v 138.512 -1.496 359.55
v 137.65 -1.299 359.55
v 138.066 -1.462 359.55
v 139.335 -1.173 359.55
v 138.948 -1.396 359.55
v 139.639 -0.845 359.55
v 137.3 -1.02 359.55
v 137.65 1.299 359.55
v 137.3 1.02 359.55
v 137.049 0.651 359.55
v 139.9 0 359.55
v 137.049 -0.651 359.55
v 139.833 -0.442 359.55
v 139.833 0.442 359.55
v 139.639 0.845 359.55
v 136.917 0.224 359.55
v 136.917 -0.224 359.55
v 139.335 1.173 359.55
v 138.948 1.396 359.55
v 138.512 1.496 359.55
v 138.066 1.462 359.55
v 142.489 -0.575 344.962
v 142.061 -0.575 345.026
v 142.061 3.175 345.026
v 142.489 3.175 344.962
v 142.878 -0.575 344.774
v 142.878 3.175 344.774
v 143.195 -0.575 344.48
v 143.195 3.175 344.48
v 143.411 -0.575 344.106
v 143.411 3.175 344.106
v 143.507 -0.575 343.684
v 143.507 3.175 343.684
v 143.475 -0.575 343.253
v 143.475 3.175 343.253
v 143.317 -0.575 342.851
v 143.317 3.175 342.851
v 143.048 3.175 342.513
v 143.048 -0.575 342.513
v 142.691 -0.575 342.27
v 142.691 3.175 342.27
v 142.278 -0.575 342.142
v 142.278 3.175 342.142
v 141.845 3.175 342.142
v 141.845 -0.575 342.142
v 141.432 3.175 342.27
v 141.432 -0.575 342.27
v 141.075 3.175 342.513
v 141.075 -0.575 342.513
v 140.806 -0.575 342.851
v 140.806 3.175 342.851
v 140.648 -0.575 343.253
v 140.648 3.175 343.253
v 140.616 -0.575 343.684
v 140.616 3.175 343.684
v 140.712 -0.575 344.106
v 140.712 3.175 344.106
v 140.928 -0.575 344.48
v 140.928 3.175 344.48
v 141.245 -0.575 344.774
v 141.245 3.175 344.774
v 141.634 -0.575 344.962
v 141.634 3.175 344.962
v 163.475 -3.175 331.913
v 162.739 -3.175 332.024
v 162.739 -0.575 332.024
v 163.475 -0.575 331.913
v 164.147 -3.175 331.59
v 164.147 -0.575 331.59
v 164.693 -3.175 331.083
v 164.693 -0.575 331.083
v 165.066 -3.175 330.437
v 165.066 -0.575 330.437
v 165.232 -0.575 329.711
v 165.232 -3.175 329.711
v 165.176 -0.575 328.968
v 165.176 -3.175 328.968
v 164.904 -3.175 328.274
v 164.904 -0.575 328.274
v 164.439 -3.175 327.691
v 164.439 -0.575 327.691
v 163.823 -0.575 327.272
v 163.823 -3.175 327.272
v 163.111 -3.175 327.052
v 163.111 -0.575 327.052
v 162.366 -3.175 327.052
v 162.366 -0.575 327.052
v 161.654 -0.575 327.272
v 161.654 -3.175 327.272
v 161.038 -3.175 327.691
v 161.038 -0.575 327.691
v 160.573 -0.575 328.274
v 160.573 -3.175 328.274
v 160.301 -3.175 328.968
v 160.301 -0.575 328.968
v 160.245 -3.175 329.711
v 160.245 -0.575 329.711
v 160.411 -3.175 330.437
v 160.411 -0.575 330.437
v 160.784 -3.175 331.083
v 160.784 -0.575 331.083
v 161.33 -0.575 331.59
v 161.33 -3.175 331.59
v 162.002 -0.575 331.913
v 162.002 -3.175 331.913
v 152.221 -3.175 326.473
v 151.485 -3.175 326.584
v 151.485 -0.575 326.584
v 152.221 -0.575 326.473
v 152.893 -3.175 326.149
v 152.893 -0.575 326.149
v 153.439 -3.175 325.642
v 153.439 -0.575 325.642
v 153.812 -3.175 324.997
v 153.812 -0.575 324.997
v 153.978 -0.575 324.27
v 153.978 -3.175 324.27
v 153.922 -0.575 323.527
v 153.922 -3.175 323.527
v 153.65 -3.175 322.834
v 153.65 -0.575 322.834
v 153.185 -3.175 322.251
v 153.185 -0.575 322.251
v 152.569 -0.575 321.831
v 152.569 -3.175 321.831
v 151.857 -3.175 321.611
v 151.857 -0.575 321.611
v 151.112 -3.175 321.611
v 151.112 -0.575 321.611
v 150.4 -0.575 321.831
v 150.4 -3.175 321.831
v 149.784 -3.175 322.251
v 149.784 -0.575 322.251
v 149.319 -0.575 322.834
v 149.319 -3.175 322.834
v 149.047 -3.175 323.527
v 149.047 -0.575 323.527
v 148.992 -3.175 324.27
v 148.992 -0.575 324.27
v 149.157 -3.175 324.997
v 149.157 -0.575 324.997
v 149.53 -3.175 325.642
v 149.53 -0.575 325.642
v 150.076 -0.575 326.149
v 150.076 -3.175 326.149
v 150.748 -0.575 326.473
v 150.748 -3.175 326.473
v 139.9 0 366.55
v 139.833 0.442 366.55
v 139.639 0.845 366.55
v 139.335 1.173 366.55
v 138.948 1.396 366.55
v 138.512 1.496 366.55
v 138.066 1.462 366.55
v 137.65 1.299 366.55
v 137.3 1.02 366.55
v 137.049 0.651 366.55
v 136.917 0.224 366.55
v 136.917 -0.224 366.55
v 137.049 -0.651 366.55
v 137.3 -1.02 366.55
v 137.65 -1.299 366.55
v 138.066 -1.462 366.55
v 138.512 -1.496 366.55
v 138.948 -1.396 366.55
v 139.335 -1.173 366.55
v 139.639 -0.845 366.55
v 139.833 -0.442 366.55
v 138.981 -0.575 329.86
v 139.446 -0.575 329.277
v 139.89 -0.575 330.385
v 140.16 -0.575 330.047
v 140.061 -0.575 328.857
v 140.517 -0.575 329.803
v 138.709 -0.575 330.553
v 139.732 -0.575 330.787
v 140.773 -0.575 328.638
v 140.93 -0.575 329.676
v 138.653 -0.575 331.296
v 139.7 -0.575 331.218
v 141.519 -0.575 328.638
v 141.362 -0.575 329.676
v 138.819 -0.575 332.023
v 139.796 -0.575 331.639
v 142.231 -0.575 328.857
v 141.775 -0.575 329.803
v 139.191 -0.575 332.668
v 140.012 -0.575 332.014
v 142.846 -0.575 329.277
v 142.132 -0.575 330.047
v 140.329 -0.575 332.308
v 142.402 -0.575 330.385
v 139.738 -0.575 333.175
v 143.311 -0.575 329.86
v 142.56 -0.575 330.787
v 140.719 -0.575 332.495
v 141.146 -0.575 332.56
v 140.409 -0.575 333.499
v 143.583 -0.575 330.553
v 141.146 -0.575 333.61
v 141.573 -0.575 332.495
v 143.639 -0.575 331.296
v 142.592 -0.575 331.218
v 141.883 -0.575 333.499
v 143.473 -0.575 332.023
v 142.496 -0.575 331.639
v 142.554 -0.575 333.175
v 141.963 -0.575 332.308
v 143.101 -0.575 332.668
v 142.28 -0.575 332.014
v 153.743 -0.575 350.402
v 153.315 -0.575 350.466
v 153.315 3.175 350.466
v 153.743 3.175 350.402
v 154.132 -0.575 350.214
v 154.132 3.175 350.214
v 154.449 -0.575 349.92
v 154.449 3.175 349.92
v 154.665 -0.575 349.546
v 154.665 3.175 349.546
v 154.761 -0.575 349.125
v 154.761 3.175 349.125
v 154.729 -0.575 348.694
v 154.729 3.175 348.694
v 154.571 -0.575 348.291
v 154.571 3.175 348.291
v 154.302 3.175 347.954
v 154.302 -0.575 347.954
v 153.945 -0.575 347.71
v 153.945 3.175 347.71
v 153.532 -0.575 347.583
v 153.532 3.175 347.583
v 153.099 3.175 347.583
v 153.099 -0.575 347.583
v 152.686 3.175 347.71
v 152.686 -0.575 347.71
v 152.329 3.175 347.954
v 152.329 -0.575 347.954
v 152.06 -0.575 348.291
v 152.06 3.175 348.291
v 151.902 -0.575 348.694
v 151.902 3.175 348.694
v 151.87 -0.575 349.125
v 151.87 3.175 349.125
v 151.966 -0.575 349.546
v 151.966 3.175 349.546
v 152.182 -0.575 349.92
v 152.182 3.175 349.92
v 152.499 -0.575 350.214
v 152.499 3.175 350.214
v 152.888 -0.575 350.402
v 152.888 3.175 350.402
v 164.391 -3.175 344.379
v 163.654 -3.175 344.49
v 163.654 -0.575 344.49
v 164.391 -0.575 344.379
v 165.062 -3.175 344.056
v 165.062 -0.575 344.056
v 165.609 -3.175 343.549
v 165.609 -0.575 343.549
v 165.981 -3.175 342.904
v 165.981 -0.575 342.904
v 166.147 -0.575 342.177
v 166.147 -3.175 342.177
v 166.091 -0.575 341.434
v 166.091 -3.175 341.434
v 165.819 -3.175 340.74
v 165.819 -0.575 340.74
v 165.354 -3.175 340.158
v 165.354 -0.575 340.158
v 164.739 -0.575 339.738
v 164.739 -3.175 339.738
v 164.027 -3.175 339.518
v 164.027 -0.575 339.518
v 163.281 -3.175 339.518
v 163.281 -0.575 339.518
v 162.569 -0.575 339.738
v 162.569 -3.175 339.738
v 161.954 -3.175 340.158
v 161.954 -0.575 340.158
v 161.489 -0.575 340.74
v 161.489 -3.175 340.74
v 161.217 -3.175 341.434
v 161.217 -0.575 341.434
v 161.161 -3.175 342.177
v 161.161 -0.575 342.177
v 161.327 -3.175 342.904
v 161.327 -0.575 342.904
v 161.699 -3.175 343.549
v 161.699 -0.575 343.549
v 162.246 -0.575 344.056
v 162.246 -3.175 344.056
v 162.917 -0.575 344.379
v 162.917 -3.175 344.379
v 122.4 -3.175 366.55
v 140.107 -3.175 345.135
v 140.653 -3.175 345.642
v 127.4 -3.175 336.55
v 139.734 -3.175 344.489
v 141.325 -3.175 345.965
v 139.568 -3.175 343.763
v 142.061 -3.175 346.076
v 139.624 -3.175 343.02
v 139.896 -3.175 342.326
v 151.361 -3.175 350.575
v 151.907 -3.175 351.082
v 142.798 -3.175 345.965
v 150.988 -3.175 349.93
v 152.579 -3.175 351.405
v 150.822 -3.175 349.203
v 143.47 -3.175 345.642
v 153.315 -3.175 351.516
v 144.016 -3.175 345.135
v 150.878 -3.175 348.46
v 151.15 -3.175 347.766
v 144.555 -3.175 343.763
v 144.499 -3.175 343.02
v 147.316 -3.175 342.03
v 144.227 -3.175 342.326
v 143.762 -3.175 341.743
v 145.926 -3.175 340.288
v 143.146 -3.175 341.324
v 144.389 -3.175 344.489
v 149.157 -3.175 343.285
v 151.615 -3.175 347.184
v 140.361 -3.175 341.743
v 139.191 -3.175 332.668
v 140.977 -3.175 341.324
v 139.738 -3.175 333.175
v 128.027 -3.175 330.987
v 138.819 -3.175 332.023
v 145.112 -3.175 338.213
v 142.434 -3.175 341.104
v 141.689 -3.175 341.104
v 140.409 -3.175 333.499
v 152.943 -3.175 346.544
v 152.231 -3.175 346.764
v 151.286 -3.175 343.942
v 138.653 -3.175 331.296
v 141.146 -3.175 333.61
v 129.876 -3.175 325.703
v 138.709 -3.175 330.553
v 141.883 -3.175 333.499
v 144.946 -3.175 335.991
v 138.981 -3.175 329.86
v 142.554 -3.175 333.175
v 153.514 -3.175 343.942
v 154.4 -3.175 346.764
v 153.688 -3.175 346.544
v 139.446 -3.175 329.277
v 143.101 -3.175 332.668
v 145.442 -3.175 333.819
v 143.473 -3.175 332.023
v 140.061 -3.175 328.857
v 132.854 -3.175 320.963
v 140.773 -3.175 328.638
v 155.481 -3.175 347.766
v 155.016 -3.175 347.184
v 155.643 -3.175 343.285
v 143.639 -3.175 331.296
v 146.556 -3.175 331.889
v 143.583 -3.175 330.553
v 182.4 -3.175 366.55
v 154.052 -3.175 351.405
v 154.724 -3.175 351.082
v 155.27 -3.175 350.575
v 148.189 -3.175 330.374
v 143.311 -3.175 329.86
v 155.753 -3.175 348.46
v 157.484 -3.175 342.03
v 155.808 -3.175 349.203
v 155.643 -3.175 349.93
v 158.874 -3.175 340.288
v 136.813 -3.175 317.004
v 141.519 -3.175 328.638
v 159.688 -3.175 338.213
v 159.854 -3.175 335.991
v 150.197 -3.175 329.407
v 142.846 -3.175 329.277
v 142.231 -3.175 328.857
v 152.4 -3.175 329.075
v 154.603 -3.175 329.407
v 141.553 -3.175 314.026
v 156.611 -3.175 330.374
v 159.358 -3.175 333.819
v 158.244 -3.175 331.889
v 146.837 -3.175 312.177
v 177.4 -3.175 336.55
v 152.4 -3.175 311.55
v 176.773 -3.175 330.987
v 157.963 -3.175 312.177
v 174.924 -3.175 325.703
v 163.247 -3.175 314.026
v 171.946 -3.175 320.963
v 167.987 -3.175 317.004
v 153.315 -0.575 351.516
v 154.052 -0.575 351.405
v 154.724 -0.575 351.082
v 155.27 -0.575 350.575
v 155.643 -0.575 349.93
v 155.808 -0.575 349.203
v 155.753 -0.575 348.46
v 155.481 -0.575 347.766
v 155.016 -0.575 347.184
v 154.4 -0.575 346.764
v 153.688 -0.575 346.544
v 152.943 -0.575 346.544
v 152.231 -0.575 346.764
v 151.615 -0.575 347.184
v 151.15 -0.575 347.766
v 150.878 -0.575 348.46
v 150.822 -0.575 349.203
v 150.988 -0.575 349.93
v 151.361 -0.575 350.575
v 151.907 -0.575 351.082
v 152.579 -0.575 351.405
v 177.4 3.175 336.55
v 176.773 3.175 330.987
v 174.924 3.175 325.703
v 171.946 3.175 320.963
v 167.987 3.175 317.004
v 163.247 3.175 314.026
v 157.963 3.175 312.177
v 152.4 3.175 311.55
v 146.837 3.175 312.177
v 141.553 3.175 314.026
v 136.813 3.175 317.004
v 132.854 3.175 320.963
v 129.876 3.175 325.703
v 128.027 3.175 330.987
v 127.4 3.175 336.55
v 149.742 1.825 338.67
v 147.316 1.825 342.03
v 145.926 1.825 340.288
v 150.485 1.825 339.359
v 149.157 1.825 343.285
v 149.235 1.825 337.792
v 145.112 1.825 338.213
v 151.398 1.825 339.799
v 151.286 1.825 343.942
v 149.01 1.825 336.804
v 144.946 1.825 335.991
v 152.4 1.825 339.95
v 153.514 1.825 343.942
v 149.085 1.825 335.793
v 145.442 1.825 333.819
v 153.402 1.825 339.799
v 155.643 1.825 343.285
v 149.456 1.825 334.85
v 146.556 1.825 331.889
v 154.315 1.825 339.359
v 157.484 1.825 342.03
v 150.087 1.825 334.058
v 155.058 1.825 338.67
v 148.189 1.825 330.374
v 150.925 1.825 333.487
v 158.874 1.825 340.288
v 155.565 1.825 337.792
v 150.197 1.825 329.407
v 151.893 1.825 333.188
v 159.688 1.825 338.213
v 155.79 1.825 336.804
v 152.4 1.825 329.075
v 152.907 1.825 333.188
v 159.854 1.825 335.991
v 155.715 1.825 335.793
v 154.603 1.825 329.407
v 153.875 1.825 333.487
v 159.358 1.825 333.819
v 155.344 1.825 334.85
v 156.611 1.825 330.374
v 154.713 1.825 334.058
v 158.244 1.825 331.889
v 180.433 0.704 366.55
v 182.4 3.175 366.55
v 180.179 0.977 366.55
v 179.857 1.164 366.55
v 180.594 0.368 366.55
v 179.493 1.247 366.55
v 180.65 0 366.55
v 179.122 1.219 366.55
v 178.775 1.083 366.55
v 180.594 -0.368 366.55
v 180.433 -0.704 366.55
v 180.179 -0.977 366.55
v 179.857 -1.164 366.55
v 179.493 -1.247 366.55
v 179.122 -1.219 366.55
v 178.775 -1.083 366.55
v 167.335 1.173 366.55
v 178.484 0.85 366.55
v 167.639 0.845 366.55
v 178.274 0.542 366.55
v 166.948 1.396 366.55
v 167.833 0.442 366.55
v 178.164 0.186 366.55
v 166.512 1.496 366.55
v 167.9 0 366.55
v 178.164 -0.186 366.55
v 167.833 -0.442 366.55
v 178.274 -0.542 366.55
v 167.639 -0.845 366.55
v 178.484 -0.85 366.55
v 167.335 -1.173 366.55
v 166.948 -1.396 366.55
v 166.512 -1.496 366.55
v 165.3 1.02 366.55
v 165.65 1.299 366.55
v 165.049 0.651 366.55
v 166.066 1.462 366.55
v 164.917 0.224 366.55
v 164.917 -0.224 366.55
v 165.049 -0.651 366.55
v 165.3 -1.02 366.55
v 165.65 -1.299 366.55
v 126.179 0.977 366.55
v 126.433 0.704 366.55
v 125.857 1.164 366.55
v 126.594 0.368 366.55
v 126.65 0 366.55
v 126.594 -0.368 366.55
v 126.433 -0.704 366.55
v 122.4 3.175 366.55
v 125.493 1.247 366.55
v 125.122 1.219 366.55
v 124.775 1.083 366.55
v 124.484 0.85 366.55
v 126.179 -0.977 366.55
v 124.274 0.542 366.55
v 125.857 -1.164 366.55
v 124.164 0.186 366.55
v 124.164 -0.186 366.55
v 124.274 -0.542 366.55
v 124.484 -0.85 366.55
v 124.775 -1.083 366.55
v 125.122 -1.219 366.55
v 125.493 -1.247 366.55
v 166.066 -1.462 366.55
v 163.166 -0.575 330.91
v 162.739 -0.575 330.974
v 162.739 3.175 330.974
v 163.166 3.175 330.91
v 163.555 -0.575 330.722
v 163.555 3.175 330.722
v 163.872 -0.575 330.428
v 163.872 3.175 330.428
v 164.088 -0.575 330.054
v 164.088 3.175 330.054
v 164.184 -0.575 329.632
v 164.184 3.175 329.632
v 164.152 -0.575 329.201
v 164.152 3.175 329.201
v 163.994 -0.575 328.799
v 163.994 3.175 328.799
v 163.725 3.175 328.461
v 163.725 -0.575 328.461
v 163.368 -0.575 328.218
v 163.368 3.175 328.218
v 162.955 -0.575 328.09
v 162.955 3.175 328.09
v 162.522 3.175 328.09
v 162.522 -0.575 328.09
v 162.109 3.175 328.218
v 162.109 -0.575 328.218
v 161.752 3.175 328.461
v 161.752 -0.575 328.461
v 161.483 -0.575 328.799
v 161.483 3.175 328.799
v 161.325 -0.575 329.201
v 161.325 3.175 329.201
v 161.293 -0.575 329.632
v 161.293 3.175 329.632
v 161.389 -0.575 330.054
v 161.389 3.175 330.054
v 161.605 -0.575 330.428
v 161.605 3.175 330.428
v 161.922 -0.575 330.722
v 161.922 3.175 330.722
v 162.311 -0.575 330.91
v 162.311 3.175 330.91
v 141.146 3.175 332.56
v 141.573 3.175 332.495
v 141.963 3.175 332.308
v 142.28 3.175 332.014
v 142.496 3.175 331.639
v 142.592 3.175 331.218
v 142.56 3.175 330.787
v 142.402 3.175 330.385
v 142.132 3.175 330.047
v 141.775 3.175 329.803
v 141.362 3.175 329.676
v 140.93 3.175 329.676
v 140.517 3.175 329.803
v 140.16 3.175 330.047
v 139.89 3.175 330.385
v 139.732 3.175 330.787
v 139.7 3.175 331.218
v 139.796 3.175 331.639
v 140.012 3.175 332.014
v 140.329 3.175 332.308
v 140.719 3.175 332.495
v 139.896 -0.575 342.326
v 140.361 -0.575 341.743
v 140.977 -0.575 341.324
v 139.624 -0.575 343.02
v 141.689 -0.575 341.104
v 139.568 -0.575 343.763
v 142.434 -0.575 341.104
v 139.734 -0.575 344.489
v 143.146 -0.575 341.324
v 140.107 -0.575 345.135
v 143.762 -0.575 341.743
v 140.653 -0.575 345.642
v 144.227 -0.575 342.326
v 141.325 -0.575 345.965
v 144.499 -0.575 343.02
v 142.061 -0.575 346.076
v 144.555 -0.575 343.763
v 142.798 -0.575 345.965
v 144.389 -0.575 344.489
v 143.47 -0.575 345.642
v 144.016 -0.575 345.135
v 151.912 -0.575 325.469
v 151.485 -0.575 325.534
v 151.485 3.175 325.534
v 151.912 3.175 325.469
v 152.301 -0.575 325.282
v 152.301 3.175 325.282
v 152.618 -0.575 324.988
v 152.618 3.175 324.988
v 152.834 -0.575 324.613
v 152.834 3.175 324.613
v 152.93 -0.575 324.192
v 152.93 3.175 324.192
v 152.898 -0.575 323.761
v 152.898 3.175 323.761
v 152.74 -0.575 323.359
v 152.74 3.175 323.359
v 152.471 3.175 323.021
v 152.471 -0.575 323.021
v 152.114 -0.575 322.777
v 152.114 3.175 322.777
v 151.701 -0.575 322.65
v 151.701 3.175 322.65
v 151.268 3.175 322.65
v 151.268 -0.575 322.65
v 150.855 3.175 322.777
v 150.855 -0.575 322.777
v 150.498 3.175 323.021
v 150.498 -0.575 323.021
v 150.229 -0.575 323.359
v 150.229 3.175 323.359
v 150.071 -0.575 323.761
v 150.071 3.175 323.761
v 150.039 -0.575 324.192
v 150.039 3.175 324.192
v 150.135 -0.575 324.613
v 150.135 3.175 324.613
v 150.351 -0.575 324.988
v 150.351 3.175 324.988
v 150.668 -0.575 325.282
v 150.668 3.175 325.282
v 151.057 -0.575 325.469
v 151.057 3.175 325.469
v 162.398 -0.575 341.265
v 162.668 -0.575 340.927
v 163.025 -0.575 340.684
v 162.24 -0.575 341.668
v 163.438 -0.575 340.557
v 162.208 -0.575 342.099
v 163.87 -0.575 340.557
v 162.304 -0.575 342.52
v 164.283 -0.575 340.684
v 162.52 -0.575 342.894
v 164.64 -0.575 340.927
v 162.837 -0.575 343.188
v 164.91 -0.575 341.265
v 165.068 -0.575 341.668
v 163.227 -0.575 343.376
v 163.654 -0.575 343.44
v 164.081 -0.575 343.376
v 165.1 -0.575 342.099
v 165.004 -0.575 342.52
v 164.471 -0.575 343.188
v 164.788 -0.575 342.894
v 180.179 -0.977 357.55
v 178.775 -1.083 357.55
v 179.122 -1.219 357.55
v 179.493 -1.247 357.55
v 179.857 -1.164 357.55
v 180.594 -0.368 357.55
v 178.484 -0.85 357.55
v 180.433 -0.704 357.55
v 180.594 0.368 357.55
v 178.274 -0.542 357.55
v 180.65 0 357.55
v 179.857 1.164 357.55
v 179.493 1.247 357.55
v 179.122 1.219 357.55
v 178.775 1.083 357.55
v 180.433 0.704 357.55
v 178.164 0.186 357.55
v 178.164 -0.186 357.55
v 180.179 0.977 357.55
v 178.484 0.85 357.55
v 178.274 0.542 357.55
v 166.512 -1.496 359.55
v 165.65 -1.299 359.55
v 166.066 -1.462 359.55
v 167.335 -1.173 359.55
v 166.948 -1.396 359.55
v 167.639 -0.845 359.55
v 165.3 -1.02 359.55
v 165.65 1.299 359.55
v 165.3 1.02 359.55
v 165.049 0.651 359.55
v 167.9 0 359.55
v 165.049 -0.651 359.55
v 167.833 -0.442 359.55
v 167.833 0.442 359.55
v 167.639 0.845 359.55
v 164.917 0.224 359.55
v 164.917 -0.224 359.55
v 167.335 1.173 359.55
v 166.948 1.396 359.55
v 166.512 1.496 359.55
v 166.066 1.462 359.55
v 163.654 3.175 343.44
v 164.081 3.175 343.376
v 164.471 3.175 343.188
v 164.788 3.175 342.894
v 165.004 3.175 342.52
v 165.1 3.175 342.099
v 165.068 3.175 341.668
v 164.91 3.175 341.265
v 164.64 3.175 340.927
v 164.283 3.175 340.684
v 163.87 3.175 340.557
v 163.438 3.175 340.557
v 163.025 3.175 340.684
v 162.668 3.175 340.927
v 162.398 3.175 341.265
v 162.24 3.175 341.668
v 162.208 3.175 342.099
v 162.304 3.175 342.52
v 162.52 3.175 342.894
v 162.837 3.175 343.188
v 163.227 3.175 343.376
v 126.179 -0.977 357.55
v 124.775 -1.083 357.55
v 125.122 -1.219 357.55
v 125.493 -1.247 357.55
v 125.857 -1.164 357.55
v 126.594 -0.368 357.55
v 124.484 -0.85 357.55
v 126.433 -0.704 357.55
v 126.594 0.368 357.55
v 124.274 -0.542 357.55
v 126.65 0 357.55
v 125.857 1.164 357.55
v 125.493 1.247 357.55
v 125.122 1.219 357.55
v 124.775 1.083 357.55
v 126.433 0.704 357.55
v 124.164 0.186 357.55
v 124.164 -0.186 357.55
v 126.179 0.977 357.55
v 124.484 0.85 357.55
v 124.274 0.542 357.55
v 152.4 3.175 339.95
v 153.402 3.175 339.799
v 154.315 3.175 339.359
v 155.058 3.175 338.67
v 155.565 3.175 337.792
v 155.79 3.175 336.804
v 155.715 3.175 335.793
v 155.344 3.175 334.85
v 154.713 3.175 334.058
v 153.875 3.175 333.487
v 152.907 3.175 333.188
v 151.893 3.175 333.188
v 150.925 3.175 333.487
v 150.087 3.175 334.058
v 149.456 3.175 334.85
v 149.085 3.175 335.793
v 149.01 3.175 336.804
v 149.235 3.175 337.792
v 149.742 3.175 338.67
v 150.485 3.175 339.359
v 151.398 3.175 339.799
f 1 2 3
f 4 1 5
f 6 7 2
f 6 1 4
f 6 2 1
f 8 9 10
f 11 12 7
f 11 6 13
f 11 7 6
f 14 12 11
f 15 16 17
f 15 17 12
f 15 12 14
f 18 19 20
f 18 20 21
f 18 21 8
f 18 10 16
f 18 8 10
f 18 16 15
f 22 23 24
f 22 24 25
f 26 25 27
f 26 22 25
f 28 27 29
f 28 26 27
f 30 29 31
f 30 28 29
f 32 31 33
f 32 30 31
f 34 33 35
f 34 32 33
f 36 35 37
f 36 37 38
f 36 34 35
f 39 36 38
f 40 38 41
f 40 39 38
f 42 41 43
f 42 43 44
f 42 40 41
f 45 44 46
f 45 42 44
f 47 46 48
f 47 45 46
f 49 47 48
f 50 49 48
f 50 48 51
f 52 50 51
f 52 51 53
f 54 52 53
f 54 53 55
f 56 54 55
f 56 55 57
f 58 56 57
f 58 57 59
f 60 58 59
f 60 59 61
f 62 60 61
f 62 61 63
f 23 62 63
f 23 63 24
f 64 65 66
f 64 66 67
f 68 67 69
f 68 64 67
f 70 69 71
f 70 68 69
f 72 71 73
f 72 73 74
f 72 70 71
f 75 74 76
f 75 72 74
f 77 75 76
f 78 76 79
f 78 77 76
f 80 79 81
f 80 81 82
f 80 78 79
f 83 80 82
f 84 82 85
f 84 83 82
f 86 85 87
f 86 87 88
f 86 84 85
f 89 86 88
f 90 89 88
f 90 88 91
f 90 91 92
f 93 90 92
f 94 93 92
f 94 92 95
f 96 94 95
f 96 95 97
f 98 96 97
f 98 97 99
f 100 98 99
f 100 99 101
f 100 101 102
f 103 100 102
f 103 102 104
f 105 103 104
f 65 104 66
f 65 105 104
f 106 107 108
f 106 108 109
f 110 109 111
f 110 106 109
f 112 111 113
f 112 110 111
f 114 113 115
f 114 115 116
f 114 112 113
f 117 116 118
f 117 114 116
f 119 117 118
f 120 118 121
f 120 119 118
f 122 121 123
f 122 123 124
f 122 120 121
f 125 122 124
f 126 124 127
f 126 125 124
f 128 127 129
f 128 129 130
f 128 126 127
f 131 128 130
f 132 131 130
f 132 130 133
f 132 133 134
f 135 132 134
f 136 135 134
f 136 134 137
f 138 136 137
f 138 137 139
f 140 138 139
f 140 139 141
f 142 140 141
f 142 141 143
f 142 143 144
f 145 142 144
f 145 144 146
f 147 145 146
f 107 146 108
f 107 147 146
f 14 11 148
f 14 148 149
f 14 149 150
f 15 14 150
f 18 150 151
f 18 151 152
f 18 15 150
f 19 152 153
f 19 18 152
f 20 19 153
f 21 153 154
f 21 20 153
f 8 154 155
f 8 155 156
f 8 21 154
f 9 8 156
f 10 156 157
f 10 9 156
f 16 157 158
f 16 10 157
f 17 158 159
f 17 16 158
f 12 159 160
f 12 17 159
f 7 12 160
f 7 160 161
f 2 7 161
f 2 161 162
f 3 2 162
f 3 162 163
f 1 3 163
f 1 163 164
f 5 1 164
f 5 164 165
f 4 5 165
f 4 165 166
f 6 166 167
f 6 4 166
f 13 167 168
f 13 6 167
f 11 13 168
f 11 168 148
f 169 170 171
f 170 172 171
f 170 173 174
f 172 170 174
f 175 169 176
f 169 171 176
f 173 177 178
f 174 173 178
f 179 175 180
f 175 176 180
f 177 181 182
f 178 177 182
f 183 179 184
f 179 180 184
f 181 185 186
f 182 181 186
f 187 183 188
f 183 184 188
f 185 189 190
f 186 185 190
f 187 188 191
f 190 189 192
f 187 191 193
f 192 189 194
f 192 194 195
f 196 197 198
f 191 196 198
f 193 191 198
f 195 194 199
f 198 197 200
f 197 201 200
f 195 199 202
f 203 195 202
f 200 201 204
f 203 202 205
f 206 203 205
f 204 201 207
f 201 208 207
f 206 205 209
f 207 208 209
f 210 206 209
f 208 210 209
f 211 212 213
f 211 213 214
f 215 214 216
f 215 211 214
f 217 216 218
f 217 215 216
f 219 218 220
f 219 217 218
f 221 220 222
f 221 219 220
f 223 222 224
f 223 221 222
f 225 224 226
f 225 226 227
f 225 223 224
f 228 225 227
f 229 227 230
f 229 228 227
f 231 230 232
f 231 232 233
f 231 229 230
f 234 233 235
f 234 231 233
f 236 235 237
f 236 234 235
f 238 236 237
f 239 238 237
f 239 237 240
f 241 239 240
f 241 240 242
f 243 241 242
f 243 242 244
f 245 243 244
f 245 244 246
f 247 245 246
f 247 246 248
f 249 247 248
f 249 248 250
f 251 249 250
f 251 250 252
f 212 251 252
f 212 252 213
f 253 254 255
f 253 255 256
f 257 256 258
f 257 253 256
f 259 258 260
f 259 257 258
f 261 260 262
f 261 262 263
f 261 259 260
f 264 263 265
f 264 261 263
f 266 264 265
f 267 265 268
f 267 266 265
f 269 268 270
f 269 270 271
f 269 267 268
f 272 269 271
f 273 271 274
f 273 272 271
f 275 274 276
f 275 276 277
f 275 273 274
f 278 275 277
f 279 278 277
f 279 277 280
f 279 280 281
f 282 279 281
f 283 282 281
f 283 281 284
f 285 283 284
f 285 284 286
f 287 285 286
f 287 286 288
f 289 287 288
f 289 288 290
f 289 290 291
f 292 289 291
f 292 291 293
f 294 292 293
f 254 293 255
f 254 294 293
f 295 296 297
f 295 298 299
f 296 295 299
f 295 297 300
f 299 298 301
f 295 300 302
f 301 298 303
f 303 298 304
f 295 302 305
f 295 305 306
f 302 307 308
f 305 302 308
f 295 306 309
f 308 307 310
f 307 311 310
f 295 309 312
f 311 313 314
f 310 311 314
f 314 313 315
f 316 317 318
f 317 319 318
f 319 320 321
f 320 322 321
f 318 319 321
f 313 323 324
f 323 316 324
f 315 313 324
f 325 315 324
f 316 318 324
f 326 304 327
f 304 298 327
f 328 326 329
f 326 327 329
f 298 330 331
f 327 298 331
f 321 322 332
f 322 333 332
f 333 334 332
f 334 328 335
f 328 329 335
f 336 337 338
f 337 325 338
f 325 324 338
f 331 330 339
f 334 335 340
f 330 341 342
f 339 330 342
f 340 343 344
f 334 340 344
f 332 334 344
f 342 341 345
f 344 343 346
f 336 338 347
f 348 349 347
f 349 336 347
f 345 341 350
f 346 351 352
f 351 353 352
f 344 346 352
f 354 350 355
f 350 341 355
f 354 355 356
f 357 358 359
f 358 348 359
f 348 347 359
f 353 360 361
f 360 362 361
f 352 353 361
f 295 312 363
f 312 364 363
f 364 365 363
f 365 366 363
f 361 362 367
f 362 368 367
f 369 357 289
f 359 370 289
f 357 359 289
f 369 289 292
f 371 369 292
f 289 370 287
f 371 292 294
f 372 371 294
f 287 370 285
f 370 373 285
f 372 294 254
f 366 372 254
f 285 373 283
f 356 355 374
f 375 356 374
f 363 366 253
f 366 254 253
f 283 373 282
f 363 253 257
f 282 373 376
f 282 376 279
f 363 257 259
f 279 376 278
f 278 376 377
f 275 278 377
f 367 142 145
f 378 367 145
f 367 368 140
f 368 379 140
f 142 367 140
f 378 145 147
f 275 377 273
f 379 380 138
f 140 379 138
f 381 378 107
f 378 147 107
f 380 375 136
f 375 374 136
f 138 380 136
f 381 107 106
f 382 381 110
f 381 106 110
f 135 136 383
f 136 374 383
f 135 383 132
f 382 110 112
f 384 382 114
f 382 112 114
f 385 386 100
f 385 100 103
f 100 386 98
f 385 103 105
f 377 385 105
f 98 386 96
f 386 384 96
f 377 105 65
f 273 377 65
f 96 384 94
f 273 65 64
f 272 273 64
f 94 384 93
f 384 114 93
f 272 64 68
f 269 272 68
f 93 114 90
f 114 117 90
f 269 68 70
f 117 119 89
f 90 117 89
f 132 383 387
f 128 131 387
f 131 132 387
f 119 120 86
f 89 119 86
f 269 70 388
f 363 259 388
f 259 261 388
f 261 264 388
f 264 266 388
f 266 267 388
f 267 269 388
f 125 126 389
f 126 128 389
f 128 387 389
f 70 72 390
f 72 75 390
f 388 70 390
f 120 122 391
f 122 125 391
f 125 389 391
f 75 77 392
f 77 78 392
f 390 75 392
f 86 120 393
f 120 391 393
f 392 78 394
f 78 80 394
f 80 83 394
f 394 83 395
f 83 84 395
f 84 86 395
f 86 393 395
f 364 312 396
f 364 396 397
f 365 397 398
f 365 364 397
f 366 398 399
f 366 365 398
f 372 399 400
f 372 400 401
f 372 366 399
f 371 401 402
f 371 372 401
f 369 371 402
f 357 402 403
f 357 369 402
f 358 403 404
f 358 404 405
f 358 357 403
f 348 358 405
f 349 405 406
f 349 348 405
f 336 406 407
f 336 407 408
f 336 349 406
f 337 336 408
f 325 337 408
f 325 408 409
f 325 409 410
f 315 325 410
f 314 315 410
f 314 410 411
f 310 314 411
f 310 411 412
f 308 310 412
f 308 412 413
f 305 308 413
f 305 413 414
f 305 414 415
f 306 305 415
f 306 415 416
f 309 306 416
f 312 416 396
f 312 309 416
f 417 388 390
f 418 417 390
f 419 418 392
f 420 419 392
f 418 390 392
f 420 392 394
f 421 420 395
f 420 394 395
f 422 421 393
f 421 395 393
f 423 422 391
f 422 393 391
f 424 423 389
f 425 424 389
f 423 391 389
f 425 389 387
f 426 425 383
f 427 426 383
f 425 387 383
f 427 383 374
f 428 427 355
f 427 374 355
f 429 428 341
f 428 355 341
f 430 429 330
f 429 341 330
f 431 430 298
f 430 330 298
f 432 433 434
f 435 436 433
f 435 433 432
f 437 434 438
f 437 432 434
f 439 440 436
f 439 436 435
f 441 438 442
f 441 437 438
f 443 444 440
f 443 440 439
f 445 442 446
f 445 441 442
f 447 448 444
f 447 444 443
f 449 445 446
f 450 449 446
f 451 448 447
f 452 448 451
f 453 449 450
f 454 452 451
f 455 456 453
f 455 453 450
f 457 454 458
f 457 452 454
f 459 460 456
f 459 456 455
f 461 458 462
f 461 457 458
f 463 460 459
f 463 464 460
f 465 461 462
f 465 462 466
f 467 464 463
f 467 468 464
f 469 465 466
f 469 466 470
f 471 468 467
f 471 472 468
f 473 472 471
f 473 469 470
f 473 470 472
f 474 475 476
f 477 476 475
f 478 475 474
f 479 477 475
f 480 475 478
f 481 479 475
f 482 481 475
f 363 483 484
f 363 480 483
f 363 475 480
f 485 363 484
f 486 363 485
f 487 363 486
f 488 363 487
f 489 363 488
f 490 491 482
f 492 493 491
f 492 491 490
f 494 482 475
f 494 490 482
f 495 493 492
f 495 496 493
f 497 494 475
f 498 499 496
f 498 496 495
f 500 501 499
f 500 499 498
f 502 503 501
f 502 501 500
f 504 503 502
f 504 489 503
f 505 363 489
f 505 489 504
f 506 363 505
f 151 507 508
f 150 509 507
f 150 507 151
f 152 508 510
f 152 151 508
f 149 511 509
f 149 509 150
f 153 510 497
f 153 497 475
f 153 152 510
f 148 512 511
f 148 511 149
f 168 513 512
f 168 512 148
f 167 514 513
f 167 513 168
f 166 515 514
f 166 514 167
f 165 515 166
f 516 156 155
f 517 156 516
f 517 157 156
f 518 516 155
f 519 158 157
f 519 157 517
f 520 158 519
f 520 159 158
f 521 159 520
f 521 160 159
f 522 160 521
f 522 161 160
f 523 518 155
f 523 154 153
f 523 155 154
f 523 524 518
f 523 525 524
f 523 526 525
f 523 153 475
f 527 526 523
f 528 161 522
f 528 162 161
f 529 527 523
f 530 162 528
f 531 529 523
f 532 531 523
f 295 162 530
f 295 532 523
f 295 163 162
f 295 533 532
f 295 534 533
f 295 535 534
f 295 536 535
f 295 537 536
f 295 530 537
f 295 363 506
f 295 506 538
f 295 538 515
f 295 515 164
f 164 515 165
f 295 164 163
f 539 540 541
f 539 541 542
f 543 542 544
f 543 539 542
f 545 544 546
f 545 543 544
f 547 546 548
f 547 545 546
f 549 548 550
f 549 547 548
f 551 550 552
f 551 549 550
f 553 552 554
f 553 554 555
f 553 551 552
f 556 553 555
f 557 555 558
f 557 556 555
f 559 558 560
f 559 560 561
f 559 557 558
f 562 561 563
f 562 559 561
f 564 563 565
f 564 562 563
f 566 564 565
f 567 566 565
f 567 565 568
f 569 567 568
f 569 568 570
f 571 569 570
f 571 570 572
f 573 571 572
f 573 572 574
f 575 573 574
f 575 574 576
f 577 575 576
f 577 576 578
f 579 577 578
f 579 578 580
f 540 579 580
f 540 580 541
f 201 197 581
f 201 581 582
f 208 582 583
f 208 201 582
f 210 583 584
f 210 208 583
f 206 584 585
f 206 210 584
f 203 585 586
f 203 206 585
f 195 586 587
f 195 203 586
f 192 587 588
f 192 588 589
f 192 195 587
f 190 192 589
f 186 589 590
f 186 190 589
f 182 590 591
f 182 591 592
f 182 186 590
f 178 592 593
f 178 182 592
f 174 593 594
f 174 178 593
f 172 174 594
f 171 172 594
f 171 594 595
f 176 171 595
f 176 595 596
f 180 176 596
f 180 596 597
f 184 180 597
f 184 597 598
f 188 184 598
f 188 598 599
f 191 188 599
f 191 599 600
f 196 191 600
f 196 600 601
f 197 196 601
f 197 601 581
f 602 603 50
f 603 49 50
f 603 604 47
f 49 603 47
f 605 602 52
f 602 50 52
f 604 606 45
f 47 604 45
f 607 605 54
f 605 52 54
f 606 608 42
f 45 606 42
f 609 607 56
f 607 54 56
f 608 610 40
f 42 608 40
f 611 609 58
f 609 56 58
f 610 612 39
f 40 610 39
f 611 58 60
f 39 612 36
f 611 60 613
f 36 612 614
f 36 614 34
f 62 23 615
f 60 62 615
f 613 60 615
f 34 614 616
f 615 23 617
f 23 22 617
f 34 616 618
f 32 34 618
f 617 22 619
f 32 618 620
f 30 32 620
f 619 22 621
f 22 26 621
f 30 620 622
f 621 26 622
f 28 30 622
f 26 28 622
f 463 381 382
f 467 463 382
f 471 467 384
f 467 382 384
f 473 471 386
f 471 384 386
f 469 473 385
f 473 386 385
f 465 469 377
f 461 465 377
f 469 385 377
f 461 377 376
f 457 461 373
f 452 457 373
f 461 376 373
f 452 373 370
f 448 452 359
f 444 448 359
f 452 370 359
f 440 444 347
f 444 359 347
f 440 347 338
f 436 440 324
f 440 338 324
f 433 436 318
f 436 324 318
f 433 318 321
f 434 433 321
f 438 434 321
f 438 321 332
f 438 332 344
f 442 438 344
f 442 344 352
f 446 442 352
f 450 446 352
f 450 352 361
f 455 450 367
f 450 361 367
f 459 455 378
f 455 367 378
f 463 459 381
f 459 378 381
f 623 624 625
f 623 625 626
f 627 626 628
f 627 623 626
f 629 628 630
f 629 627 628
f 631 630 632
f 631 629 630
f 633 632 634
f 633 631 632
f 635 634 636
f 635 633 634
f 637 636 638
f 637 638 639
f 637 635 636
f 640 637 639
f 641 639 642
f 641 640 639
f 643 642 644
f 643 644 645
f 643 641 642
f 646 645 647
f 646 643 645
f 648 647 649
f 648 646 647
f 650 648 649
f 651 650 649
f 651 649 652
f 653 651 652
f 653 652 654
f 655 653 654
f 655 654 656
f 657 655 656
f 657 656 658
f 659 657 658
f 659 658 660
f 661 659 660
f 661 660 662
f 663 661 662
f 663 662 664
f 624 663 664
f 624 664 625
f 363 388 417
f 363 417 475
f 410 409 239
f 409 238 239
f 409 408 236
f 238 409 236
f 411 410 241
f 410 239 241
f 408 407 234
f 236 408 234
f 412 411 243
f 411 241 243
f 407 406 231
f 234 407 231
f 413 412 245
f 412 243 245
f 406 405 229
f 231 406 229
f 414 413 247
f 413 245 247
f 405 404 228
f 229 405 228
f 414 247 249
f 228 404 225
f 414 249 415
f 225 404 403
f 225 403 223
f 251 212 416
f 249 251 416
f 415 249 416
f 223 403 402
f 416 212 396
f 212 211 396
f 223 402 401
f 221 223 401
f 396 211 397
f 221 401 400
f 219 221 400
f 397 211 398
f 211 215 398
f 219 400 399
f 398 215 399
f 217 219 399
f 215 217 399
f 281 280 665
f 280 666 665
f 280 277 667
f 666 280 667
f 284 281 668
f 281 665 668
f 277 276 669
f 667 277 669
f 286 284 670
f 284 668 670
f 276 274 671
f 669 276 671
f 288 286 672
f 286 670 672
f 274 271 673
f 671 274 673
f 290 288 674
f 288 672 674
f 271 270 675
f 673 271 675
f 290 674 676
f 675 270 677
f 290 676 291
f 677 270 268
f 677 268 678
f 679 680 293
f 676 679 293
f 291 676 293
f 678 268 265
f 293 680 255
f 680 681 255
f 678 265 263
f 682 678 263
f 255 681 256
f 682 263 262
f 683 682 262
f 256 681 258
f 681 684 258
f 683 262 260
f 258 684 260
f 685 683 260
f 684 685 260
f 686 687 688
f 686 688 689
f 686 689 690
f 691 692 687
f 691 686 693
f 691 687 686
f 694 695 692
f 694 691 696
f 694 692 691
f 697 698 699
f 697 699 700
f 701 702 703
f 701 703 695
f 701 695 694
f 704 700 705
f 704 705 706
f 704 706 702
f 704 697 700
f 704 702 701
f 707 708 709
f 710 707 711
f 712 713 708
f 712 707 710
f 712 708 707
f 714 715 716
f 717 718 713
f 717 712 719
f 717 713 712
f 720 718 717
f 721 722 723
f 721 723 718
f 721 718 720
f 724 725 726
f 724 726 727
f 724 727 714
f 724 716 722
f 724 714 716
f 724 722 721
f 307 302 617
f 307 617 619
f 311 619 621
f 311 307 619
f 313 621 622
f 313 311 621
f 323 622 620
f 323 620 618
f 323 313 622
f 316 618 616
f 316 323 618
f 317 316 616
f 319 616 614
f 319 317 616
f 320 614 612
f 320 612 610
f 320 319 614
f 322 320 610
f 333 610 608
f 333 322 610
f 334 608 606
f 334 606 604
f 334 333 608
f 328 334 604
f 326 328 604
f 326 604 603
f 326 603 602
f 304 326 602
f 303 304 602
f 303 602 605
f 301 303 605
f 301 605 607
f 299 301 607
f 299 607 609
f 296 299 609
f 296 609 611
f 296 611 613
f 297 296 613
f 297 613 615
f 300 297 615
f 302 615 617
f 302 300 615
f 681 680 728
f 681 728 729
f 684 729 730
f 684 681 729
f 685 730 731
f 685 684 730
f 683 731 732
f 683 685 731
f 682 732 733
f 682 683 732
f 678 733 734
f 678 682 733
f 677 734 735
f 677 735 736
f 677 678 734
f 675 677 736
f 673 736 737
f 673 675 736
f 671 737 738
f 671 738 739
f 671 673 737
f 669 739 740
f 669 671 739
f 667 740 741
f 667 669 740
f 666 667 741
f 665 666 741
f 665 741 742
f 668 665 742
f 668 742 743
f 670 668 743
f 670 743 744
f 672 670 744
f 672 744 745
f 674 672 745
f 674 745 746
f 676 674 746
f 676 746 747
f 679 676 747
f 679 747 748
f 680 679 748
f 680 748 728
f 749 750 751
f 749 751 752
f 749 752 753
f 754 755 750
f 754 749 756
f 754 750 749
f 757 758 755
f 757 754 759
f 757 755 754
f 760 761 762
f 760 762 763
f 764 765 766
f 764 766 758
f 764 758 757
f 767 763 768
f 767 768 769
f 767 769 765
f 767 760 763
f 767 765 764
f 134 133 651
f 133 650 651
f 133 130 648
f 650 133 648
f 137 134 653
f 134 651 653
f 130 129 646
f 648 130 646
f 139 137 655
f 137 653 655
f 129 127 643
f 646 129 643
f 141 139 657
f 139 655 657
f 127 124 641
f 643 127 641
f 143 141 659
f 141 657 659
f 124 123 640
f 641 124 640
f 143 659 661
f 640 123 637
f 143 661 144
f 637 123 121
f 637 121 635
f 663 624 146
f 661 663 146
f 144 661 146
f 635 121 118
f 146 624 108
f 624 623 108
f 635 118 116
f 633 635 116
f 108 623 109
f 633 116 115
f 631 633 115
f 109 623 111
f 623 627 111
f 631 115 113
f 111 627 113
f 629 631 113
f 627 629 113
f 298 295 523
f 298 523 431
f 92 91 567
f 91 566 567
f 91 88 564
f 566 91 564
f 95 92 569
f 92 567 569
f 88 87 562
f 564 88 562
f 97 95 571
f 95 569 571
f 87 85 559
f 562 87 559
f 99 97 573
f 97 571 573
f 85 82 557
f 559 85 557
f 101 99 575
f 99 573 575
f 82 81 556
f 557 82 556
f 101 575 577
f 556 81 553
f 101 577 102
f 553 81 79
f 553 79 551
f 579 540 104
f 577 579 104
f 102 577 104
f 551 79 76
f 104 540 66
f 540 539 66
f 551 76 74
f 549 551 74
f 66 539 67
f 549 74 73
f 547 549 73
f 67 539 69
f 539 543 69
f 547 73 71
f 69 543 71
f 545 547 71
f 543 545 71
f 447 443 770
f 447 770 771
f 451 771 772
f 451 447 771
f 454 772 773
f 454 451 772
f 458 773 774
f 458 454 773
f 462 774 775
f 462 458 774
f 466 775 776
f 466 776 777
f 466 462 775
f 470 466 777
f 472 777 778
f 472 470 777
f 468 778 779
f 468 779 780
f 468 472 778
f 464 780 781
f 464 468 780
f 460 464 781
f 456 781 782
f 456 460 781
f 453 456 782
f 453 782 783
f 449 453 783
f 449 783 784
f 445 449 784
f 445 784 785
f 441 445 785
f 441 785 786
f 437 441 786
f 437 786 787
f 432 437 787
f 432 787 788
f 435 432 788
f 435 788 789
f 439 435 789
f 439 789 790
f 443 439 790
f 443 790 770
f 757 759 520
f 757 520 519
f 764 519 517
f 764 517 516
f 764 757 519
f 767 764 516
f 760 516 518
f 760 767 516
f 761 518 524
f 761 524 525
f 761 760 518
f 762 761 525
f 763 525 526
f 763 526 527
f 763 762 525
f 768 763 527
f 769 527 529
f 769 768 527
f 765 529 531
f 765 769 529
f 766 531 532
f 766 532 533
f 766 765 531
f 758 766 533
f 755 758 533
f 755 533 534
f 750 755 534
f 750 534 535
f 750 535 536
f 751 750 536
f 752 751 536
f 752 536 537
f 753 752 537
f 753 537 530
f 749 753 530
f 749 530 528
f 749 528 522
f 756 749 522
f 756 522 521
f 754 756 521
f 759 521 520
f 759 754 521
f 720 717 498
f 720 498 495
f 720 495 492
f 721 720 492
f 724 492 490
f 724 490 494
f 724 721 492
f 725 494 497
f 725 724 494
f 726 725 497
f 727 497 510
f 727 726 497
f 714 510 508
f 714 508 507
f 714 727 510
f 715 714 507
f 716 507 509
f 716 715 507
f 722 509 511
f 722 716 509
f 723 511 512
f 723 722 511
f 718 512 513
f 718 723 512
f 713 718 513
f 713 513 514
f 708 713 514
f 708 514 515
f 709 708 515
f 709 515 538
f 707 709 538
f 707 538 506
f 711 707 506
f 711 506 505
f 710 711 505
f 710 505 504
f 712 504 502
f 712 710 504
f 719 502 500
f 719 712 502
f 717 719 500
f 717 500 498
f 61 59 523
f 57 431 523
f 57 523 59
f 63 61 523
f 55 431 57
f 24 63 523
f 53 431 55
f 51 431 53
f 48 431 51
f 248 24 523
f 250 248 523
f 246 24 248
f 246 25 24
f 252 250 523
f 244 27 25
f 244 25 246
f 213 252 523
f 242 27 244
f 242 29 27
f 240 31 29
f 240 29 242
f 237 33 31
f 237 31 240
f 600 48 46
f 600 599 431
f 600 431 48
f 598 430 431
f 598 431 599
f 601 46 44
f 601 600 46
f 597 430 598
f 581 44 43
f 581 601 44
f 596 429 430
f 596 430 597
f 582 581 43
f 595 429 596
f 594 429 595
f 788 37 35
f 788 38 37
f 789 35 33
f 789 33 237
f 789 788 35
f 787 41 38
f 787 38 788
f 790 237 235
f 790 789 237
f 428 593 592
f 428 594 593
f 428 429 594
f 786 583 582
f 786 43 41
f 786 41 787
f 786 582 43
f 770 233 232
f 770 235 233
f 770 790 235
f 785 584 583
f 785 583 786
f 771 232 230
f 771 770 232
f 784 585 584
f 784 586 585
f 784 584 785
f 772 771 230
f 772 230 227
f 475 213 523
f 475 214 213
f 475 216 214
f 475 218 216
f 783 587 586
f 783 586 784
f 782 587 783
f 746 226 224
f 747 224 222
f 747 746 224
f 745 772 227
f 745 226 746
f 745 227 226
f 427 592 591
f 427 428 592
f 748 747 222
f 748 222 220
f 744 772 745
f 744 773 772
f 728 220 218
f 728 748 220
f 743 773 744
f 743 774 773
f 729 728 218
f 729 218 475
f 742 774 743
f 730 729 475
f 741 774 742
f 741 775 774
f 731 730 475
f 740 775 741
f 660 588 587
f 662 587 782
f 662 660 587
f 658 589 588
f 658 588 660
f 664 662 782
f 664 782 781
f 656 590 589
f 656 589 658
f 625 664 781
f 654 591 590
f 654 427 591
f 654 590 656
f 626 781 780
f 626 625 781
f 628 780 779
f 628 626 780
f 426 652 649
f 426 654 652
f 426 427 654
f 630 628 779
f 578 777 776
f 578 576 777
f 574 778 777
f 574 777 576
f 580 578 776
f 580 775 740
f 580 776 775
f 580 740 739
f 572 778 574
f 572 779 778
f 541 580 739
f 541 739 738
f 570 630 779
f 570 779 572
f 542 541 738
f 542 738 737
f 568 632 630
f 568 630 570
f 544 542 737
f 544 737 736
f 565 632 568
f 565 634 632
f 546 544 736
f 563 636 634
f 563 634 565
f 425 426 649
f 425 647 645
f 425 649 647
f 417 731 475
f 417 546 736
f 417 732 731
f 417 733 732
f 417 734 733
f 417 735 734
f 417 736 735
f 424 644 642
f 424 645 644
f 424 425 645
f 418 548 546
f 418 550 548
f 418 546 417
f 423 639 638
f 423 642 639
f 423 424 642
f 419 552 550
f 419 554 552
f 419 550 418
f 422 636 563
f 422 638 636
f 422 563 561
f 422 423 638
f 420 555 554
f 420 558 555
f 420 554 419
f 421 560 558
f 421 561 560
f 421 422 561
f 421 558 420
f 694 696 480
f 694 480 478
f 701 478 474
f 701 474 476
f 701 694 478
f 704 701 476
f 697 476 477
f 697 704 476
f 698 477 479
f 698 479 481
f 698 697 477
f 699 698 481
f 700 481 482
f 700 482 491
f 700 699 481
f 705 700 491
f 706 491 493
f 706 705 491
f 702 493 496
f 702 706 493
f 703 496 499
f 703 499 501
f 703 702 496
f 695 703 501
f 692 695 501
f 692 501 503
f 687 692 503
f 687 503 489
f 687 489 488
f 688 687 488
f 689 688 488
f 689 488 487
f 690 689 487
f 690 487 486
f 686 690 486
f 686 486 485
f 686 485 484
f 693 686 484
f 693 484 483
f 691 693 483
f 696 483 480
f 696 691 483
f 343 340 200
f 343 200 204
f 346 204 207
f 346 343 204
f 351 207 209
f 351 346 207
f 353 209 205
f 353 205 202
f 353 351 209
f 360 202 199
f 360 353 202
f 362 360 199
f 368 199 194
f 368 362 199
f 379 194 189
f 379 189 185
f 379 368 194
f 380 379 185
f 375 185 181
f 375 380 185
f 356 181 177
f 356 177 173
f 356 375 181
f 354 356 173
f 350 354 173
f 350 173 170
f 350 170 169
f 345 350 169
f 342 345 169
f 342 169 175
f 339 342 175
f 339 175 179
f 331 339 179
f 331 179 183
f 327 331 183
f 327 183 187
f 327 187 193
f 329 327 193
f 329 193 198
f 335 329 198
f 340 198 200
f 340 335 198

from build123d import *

# Parameters (mm, degrees)
PLACA_J5_START           = -3.175
PLACA_J5_DEPTH           = 6.35
PLACA_J5_REDONDEO_START  = -3.175
CROQUIS9_R               = 25
PLACA_J5_REDONDEO_DEPTH  = 6.35
BARRENOS_SALIDA_M5_START = -3.175
CROQUIS10_R              = 1.45
CROQUIS10_R_2            = 3.4
BARRENOS_SALIDA_M5_DEPTH = 6.35
REFRENTADO_M2_5_START    = -3.175
CROQUIS11_R              = 2.5
REFRENTADO_M2_5_DEPTH    = 2.6
ROSCA_M3_CANTO_START     = 357.55
CROQUIS12_R              = 1.25
ROSCA_M3_CANTO_DEPTH     = 9
PASADORES_D3_START       = 359.55
CROQUIS13_R              = 1.5
PASADORES_D3_DEPTH       = 7
CROQUIS14_R              = 7.475
CORTAR_EXTRUIR1_DEPTH    = 5


with BuildPart() as part:
    # Croquis8 → Placa_J5 (new body)
    with BuildSketch(Plane(origin=(0, 0, 0), x_dir=(1, 0, 0), z_dir=(0, 1, 0)).offset(PLACA_J5_START)):
        Polygon((127.4, -336.55), (177.4, -336.55), (182.4, -366.55), (122.4, -366.55), align=None)
    extrude(amount=PLACA_J5_DEPTH)

    # Croquis9 → Placa_J5_redondeo (add)
    with BuildSketch(Plane(origin=(0, 0, 0), x_dir=(1, 0, 0), z_dir=(0, 1, 0)).offset(PLACA_J5_REDONDEO_START)):
        with Locations((152.4, -336.55)):
            Circle(CROQUIS9_R)
    extrude(amount=PLACA_J5_REDONDEO_DEPTH)

    # Croquis10 → Barrenos_salida_M5 (cut)
    with BuildSketch(Plane(origin=(0, 0, 0), x_dir=(1, 0, 0), z_dir=(0, 1, 0)).offset(BARRENOS_SALIDA_M5_START)):
        with Locations((163.653984643, -341.990388742)):
            Circle(CROQUIS10_R)
        with Locations((153.315477464, -349.016430965)):
            Circle(CROQUIS10_R)
        with Locations((142.061492822, -343.576042223)):
            Circle(CROQUIS10_R)
        with Locations((141.146015357, -331.109611258)):
            Circle(CROQUIS10_R)
        with Locations((151.484522536, -324.083569035)):
            Circle(CROQUIS10_R)
        with Locations((162.738507178, -329.523957777)):
            Circle(CROQUIS10_R)
        with Locations((152.4, -336.55)):
            Circle(CROQUIS10_R_2)
    extrude(amount=BARRENOS_SALIDA_M5_DEPTH, mode=Mode.SUBTRACT)

    # Croquis11 → Refrentado_M2-5 (cut)
    with BuildSketch(Plane(origin=(0, 0, 0), x_dir=(1, 0, 0), z_dir=(0, 1, 0)).offset(REFRENTADO_M2_5_START)):
        with Locations((163.653984643, -341.990388742)):
            Circle(CROQUIS11_R)
        with Locations((153.315477464, -349.016430965)):
            Circle(CROQUIS11_R)
        with Locations((142.061492822, -343.576042223)):
            Circle(CROQUIS11_R)
        with Locations((141.146015357, -331.109611258)):
            Circle(CROQUIS11_R)
        with Locations((151.484522536, -324.083569035)):
            Circle(CROQUIS11_R)
        with Locations((162.738507178, -329.523957777)):
            Circle(CROQUIS11_R)
    extrude(amount=REFRENTADO_M2_5_DEPTH, mode=Mode.SUBTRACT)

    # Croquis12 → Rosca_M3_canto (cut)
    with BuildSketch(Plane.XY.offset(ROSCA_M3_CANTO_START)):
        with Locations((125.4, 0)):
            Circle(CROQUIS12_R)
        with Locations((179.4, 0)):
            Circle(CROQUIS12_R)
    extrude(amount=ROSCA_M3_CANTO_DEPTH, mode=Mode.SUBTRACT)

    # Croquis13 → Pasadores_D3 (cut)
    with BuildSketch(Plane.XY.offset(PASADORES_D3_START)):
        with Locations((138.4, 0)):
            Circle(CROQUIS13_R)
        with Locations((166.4, 0)):
            Circle(CROQUIS13_R)
    extrude(amount=PASADORES_D3_DEPTH, mode=Mode.SUBTRACT)

    # Croquis14 → Cortar-Extruir1 (cut)
    with BuildSketch(Plane.XZ.offset(3.175)):
        with Locations((152.4, 336.55)):
            Circle(CROQUIS14_R)
    extrude(amount=-CORTAR_EXTRUIR1_DEPTH, mode=Mode.SUBTRACT)


solid = part.part
